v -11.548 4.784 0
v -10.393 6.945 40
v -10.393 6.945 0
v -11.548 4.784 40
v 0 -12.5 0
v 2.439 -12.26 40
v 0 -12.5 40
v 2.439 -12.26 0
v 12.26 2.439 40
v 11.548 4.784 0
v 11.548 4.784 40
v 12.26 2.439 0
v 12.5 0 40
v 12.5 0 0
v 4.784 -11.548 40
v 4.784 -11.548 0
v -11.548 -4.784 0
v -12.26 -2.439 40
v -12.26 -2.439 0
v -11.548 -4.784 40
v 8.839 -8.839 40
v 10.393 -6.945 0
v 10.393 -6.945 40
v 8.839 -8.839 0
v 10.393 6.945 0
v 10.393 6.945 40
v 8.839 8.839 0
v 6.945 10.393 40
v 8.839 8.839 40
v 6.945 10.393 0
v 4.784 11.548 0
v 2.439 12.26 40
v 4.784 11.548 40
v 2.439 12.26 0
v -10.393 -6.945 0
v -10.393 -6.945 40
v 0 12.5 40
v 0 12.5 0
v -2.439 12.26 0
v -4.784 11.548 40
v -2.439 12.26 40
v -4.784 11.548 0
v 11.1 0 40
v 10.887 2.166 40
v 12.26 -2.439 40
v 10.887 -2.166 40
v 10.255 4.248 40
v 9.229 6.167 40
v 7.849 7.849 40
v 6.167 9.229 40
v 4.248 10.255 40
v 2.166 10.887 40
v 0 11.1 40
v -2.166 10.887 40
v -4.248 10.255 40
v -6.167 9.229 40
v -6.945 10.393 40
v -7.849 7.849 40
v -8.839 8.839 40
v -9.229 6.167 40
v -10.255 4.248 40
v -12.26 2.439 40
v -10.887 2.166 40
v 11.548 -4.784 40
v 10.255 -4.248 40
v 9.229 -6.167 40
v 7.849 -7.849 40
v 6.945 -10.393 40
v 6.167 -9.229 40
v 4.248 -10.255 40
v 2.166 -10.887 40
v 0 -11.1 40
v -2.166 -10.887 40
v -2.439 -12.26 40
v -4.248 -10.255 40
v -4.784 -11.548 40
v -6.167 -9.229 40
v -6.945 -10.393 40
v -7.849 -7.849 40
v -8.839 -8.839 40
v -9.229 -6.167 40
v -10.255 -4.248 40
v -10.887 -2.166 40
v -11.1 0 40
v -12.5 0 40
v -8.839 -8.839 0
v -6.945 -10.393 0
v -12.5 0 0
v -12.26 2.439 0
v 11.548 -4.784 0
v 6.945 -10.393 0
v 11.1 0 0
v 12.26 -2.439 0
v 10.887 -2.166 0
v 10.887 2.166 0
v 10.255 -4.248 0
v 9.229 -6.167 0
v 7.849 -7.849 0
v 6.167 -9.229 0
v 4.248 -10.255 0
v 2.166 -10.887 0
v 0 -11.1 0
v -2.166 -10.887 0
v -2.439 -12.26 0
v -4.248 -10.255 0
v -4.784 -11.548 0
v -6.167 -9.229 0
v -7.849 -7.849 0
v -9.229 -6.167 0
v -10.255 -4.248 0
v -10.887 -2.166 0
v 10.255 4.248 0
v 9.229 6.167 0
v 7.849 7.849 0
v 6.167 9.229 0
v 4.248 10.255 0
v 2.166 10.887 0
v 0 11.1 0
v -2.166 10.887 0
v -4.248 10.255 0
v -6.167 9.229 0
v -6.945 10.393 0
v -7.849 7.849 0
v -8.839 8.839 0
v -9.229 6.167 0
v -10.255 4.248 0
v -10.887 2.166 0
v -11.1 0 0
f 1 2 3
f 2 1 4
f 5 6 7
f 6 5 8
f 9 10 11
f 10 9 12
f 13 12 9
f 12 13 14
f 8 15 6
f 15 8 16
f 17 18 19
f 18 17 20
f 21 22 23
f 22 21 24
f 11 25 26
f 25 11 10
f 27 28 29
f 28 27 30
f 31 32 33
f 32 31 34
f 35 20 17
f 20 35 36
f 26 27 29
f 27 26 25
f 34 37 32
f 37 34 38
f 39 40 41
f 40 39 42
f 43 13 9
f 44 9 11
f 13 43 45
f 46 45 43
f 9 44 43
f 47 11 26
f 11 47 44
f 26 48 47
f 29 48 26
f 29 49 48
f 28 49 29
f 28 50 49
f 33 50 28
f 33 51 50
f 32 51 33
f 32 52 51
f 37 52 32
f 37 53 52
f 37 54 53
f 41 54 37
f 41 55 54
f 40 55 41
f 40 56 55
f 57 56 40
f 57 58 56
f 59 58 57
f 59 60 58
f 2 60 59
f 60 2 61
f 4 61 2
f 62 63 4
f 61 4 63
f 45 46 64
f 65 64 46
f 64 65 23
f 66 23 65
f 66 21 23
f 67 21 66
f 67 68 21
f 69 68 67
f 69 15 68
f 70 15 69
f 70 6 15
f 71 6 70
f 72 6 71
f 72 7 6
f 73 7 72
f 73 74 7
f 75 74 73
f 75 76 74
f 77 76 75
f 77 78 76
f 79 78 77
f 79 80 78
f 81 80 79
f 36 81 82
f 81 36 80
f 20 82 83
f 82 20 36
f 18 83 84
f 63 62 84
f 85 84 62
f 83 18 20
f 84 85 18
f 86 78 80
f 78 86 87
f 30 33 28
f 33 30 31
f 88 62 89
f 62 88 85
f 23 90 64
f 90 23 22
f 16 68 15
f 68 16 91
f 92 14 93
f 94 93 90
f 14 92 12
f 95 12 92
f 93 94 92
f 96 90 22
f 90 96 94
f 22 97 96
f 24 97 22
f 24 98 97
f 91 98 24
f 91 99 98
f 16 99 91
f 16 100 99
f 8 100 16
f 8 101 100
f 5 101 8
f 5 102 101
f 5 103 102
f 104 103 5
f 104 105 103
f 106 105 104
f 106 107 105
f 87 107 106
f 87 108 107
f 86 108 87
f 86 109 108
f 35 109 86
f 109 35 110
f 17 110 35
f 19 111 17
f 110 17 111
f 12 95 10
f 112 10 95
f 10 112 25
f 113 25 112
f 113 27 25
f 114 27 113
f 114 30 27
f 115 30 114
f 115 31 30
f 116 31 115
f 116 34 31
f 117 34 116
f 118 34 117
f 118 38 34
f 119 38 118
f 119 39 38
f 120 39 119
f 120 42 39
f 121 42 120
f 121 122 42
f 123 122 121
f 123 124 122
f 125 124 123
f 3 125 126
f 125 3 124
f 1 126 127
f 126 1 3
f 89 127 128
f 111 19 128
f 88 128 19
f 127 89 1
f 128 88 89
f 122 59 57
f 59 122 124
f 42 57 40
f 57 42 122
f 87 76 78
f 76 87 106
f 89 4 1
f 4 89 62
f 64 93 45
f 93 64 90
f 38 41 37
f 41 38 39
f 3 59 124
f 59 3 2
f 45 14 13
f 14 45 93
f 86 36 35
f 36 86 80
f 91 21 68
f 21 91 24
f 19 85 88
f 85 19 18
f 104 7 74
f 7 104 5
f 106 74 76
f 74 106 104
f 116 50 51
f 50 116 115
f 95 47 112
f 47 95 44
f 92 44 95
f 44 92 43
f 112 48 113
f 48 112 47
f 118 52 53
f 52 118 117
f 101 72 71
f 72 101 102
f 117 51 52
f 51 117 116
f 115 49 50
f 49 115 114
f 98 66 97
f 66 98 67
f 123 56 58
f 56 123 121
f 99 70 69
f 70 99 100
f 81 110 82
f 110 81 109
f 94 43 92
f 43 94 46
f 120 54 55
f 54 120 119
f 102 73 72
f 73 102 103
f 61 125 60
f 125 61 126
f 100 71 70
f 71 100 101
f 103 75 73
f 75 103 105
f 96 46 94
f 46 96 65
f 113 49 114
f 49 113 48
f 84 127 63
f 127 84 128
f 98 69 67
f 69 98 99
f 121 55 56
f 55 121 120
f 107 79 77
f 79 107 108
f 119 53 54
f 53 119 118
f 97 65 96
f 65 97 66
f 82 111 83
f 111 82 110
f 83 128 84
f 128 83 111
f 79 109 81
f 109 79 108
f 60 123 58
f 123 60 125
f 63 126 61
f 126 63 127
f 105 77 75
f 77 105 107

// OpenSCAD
$fn = 32;

// ----------------------------------------------------------------------
// Thin tube: 1.4 mm wall
// ----------------------------------------------------------------------

// --- parameters (mm) ---
tube_od = 25;             // outer diameter
tube_h = 40;              // height, Z
wall = 1.4;               // wall thickness
fit_tol = 0.05;           // tolerance for press fits, mm
free_tol = 0.3;           // tolerance for clearance fits, mm

difference() {
  cylinder(h = tube_h, d = tube_od);
  translate([0, 0, -1]) cylinder(h = tube_h + 2, d = tube_od - 2 * wall);
}
